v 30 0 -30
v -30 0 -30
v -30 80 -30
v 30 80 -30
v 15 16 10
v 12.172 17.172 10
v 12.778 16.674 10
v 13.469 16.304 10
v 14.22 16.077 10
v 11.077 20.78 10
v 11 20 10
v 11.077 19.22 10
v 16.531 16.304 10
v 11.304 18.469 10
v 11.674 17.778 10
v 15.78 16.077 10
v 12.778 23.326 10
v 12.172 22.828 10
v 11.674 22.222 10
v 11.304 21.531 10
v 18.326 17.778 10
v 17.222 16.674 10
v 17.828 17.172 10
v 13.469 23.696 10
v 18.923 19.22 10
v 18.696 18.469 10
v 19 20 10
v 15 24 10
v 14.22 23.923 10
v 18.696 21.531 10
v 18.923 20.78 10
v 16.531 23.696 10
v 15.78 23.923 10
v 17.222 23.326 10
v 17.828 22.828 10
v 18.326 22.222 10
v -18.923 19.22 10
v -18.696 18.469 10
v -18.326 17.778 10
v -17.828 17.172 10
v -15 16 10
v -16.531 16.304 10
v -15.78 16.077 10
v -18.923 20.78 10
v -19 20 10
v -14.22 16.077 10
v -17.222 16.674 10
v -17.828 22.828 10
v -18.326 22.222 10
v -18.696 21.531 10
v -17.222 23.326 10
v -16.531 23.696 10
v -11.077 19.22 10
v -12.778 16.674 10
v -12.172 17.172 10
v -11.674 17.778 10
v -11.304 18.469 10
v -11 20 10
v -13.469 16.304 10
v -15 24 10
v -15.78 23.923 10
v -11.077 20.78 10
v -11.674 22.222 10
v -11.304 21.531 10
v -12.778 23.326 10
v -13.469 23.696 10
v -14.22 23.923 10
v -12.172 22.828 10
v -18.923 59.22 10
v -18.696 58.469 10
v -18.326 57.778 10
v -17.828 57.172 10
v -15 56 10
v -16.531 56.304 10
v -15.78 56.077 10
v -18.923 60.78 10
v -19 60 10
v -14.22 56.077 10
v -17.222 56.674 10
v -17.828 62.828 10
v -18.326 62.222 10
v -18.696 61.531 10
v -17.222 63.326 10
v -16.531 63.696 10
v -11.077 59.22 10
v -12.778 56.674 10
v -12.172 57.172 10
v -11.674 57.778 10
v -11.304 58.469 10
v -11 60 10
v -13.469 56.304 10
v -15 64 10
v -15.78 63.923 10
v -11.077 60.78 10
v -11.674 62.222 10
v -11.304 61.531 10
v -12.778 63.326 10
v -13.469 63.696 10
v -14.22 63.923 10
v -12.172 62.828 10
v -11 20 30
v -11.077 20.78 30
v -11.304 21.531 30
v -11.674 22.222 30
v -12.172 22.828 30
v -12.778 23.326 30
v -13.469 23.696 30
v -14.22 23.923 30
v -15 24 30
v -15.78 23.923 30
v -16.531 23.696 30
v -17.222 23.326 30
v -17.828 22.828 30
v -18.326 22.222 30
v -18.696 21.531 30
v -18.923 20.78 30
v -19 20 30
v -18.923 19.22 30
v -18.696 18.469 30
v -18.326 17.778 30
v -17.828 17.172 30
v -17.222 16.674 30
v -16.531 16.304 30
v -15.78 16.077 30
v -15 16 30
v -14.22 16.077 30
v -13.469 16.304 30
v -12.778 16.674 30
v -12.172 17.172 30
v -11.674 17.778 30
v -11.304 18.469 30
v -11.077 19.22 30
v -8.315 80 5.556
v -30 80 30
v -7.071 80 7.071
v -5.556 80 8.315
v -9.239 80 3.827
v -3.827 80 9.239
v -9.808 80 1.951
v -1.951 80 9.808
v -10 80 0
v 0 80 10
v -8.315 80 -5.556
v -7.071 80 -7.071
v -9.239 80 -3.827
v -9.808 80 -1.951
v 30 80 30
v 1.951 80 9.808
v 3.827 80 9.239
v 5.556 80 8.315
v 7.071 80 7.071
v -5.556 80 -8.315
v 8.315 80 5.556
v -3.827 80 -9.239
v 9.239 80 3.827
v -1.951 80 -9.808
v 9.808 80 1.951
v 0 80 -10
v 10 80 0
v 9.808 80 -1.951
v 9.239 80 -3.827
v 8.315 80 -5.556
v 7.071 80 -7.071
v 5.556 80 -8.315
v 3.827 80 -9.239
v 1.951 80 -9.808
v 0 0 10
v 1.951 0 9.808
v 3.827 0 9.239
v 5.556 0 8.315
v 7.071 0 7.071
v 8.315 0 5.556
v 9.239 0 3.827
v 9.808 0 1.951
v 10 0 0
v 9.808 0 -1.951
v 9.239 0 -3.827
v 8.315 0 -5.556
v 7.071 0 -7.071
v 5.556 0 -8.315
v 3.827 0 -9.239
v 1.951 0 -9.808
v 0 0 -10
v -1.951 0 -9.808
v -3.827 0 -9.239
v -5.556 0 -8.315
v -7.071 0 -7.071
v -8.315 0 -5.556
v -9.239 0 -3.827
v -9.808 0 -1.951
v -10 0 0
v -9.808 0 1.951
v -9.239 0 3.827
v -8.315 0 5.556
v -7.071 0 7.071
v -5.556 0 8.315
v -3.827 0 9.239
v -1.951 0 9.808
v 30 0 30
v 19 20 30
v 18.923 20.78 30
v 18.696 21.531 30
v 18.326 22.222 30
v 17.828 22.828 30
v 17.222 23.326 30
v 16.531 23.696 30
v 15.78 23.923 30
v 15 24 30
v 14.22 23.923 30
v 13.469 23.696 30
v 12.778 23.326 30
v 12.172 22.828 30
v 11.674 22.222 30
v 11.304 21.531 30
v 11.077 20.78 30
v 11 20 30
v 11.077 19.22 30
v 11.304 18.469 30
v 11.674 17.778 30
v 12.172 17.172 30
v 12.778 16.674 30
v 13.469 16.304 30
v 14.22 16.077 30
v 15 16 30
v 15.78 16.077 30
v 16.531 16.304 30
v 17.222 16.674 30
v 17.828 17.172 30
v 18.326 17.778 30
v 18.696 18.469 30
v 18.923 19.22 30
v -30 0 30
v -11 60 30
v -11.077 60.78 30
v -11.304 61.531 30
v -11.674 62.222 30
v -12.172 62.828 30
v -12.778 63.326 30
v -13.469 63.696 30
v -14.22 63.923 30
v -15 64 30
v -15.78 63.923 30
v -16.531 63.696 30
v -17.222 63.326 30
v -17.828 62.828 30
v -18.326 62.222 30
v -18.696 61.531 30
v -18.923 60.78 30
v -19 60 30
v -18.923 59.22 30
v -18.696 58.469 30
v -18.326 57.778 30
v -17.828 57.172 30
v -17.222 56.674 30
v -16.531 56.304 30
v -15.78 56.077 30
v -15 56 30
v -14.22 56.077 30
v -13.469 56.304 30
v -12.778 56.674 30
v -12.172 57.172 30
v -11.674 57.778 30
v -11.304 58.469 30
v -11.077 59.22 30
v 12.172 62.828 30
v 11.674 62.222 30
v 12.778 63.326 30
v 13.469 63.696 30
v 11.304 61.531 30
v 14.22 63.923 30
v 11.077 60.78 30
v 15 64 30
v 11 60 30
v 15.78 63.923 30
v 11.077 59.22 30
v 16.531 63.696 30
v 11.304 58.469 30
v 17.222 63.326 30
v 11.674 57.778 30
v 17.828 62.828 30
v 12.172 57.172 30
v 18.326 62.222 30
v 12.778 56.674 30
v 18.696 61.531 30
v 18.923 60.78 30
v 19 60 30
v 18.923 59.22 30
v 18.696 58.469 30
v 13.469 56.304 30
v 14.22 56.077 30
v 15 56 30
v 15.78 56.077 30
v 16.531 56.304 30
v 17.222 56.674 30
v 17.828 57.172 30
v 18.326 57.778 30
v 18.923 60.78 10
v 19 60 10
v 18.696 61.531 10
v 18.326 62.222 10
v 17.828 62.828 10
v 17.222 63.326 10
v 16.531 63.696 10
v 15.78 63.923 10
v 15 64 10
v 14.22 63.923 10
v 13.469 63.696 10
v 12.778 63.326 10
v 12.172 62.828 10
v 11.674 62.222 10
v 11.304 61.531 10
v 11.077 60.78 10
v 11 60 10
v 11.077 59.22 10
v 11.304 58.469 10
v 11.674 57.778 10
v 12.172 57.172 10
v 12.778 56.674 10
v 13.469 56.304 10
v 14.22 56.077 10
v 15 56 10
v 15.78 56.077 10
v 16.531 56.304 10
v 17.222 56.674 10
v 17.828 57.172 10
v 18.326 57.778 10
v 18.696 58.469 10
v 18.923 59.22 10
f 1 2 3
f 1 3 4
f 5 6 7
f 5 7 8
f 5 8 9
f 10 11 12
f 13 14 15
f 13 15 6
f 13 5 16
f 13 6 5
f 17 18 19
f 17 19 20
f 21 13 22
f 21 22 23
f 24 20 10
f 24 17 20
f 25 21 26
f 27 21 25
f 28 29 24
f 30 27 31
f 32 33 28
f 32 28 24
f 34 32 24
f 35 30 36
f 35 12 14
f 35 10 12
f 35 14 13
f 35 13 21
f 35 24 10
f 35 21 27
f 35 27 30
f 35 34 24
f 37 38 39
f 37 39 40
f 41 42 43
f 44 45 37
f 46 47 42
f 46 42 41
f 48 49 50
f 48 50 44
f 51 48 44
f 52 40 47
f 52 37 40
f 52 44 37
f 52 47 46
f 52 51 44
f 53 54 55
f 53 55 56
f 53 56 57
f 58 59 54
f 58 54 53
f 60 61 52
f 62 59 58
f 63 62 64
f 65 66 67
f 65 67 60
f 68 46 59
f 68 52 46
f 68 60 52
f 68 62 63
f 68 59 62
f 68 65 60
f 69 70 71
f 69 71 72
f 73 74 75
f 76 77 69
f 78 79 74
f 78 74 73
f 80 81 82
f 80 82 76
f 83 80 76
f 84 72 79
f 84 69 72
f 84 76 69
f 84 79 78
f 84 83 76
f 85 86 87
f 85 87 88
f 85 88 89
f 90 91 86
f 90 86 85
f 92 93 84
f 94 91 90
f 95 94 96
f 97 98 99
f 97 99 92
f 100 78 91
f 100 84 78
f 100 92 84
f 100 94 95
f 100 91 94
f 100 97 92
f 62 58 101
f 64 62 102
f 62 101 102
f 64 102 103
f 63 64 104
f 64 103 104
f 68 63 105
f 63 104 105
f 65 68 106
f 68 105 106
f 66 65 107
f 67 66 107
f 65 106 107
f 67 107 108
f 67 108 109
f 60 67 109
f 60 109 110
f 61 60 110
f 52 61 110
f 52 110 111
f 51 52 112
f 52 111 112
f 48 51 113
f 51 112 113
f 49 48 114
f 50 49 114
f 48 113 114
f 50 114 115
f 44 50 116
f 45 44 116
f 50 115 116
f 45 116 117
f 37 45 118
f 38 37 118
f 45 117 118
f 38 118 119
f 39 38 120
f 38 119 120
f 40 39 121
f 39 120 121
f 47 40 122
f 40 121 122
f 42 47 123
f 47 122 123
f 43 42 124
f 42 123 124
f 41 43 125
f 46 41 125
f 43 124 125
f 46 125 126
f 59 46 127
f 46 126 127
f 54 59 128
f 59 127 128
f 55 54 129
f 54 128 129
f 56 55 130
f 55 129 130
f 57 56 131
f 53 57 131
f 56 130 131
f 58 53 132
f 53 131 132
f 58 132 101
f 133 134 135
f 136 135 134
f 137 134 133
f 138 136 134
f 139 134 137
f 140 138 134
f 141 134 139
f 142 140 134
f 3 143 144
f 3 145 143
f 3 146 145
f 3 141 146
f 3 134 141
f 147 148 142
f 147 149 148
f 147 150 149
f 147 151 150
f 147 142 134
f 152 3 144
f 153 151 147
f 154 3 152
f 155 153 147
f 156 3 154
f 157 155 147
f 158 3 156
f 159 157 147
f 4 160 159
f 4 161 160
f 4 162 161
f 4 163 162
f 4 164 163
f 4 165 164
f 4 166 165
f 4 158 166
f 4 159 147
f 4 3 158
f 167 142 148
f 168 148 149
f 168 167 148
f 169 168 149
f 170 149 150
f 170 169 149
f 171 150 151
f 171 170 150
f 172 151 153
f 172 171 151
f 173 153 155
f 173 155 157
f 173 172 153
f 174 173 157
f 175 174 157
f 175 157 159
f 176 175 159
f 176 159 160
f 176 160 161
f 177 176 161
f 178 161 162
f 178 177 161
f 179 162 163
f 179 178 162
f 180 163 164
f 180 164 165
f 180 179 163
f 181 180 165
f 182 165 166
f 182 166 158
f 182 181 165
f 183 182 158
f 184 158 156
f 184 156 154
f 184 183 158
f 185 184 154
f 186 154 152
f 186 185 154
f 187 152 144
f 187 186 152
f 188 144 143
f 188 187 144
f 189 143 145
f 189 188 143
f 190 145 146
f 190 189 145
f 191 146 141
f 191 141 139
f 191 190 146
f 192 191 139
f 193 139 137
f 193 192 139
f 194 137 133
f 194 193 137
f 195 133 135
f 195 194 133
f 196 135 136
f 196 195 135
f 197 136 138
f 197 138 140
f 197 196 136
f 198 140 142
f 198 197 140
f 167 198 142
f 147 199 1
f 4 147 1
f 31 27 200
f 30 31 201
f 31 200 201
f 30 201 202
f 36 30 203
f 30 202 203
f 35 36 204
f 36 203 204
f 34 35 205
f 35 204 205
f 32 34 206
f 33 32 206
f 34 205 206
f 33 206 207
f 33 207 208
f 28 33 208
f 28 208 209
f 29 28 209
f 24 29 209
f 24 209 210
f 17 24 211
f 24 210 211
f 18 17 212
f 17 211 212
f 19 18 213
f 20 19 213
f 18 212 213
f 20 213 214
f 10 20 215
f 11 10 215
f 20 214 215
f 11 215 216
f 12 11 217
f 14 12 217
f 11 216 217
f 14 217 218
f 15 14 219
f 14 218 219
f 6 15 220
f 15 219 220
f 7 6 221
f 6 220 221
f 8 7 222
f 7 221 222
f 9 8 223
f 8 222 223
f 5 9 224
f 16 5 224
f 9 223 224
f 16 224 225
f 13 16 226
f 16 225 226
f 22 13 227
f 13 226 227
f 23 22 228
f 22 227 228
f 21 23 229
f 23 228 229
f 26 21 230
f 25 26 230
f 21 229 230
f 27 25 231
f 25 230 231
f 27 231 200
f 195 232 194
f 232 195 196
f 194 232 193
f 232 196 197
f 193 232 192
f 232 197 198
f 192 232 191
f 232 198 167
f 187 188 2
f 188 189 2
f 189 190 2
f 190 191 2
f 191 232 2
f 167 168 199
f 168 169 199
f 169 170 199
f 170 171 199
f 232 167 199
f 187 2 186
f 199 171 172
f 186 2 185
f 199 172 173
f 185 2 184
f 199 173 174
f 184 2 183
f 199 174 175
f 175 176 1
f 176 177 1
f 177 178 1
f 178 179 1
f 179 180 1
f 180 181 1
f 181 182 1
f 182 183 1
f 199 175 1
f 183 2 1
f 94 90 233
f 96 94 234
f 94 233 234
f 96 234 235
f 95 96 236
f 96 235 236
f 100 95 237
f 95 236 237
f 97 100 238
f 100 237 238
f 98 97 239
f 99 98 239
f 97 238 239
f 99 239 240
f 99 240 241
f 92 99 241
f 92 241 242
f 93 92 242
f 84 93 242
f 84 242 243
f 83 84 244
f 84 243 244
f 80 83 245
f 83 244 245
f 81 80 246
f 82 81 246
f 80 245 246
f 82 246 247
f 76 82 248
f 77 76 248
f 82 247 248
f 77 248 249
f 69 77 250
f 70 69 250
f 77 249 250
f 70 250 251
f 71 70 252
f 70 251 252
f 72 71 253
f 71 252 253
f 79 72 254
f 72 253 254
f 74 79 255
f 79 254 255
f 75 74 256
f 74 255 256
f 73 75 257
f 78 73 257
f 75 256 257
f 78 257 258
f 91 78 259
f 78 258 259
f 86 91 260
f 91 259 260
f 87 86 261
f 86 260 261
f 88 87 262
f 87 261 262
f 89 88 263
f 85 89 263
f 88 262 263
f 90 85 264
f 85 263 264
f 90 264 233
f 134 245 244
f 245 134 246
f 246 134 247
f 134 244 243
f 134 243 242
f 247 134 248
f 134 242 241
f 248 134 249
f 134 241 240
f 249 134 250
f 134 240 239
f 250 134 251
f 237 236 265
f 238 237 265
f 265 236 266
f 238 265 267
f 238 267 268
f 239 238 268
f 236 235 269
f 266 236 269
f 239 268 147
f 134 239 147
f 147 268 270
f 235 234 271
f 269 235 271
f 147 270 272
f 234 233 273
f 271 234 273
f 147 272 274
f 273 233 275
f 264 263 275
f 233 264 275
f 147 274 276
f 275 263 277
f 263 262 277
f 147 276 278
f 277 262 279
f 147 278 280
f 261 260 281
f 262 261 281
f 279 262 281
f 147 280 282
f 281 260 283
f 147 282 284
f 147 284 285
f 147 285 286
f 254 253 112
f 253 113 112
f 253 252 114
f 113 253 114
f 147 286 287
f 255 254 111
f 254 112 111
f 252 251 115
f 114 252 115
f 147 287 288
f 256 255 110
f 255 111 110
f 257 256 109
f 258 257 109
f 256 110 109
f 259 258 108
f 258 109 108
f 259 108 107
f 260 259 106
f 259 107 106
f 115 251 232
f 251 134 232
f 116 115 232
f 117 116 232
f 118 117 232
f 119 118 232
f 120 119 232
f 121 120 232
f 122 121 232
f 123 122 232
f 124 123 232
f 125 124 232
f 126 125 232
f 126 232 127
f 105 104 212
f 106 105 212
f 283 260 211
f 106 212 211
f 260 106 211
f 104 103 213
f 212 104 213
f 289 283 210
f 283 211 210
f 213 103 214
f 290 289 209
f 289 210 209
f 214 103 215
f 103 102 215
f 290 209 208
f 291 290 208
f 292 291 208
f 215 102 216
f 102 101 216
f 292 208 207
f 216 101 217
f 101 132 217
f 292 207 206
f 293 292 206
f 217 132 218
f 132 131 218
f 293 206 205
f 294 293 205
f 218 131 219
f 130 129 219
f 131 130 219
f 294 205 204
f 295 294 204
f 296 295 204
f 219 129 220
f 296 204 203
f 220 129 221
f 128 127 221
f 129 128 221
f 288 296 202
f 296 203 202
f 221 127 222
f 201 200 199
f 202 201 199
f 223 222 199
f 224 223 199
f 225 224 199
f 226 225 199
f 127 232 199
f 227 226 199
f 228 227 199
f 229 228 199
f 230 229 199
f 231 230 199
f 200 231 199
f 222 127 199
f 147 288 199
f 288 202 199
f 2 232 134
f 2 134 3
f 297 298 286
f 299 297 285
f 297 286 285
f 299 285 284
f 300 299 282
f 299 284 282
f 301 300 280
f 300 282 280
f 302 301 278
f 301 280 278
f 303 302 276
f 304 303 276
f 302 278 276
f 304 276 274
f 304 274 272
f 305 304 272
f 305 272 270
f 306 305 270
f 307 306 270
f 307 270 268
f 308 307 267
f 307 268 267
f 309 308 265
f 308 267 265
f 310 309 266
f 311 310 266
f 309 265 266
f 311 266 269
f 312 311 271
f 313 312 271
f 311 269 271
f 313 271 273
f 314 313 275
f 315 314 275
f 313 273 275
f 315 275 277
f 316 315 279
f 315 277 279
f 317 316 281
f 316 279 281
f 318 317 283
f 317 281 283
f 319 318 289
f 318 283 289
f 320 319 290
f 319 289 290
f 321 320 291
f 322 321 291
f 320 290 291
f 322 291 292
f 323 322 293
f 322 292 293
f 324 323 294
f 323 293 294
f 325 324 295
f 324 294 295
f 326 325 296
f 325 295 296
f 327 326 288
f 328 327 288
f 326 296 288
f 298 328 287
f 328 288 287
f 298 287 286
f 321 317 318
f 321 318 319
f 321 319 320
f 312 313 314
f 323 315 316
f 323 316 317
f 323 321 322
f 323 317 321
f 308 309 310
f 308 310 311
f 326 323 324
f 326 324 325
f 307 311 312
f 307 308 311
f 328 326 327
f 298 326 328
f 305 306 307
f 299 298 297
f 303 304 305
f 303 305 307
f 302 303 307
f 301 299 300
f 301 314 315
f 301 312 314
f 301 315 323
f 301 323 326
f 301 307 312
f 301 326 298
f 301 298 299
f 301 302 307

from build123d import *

# Parameters (mm, degrees)
CROQUIS1_W              = 60
CROQUIS1_H              = 60
CROQUIS1_R              = 10
SALIENTE_EXTRUIR1_DEPTH = 80
CROQUIS2_R              = 4
CORTAR_EXTRUIR1_DEPTH   = 20


with BuildPart() as part:
    # Croquis1 → Saliente-Extruir1 (new body)
    with BuildSketch(Plane(origin=(0, 0, 0), x_dir=(1, 0, 0), z_dir=(0, 1, 0))):
        Rectangle(CROQUIS1_W, CROQUIS1_H)
        with Locations(Location((0, 0, 0), (0, 0, 270))):
            Circle(CROQUIS1_R, mode=Mode.SUBTRACT)
    extrude(amount=SALIENTE_EXTRUIR1_DEPTH)

    # Croquis2 → Cortar-Extruir1 (cut)
    with BuildSketch(Plane.XY.offset(30)):
        with Locations((-15, 60)):
            Circle(CROQUIS2_R)
        with Locations((15, 60)):
            Circle(CROQUIS2_R)
        with Locations((-15, 20)):
            Circle(CROQUIS2_R)
        with Locations((15, 20)):
            Circle(CROQUIS2_R)
    extrude(amount=-CORTAR_EXTRUIR1_DEPTH, mode=Mode.SUBTRACT)


solid = part.part
